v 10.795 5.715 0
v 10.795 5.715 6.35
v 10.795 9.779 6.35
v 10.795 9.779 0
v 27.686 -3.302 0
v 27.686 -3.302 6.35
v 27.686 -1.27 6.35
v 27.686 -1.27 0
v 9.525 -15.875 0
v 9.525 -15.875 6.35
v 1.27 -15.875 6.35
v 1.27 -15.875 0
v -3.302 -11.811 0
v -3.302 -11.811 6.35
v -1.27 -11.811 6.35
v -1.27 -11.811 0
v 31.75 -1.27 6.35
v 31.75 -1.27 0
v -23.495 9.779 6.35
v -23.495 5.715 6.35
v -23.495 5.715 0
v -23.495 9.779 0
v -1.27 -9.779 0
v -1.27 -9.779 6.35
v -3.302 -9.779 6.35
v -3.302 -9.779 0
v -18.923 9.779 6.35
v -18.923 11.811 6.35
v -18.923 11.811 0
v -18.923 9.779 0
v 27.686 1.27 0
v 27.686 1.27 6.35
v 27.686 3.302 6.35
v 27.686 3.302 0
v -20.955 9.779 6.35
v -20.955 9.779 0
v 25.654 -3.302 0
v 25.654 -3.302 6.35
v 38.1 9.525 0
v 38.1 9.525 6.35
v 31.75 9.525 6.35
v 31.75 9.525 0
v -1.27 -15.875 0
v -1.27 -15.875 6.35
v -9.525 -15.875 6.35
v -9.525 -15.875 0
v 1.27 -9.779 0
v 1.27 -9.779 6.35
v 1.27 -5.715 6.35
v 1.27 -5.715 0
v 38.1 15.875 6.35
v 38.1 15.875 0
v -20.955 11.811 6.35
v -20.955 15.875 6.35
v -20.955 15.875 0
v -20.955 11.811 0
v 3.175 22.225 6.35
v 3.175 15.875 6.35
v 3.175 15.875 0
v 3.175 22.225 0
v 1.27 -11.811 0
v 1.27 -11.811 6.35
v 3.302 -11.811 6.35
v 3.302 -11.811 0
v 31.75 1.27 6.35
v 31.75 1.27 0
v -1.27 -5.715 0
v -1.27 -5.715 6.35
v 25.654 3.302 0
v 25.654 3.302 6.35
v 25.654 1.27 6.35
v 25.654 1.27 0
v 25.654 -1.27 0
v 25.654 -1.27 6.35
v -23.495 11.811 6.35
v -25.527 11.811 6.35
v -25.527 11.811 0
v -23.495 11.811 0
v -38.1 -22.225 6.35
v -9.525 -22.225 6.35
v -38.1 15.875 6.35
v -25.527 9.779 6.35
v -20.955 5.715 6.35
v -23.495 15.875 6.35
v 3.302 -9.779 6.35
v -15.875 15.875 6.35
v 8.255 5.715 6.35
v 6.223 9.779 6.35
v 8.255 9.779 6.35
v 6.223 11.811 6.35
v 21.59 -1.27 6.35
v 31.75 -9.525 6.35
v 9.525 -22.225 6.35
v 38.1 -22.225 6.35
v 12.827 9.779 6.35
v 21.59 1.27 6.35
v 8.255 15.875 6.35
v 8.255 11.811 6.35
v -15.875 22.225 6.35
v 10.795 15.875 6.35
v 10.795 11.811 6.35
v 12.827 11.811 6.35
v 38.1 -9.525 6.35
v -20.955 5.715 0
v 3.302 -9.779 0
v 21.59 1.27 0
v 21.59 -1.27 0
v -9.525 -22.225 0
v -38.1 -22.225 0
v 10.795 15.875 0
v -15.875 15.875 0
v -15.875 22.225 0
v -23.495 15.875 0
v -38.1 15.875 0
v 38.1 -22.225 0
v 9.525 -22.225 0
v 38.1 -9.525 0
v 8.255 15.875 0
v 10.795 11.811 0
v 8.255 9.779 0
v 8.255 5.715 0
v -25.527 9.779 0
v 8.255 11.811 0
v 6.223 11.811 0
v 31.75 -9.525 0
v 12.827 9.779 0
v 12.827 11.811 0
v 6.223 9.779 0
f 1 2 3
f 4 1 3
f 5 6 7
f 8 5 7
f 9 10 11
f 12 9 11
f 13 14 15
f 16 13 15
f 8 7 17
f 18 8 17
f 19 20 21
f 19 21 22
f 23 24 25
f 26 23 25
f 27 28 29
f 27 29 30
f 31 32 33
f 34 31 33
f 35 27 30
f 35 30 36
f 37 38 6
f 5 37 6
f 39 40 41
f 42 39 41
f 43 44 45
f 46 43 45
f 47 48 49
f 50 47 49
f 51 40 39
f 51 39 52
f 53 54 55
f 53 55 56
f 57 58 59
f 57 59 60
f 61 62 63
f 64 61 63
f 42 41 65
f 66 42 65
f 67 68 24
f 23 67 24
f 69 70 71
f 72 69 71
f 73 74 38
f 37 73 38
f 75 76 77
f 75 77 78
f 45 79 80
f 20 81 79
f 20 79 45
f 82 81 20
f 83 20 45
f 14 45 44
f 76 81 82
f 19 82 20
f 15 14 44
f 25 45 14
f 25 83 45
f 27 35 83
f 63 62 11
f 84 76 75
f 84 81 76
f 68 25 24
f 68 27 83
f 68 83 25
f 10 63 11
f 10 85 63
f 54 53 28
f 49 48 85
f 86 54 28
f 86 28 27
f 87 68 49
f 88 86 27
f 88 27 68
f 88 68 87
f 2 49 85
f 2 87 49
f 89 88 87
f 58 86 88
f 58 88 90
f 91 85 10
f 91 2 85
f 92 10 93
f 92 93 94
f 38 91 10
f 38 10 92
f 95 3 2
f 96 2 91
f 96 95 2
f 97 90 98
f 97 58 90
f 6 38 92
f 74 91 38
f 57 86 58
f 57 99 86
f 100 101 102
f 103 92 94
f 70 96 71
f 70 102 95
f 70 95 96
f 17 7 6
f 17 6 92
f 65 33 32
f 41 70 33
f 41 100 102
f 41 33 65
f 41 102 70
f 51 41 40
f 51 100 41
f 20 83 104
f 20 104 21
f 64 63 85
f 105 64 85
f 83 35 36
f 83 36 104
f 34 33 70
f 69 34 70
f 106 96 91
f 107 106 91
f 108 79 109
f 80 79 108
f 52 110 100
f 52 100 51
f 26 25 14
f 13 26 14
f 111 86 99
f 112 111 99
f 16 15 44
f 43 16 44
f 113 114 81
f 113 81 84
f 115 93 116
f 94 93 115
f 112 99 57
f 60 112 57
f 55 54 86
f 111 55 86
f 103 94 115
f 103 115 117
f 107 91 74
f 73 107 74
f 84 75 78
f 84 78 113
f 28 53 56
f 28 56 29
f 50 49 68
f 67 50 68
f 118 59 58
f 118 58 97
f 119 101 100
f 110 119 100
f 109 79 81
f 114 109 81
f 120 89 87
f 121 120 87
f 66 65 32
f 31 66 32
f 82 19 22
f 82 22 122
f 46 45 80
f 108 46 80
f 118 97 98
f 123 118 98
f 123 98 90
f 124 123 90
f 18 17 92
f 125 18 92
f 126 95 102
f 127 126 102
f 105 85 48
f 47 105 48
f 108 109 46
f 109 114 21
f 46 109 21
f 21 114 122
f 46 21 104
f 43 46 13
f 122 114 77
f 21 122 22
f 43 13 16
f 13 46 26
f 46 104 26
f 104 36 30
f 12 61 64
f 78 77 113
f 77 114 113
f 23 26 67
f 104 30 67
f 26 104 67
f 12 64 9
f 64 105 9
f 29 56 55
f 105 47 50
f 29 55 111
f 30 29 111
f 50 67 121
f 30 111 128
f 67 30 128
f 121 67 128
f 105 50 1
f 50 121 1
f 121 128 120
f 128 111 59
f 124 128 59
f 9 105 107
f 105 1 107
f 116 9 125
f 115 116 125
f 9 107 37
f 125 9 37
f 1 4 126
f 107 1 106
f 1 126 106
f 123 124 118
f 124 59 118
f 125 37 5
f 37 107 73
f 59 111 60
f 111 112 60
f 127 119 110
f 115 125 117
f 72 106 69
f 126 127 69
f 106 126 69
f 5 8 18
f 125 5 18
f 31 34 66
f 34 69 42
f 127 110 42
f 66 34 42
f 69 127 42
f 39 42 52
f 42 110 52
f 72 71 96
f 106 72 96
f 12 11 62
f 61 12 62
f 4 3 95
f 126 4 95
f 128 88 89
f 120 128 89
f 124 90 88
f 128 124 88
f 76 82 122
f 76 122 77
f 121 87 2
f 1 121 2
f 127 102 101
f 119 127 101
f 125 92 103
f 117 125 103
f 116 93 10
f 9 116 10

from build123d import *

# Parameters (mm, degrees)
SKETCH1_W           = 76.2
SKETCH1_H           = 31.75
BOSS_EXTRUDE1_DEPTH = 6.35
SKETCH2_W           = 19.05
SKETCH2_H           = 6.35
BOSS_EXTRUDE2_DEPTH = 6.35
CUT_EXTRUDE1_DEPTH  = 6.35
CUT_EXTRUDE4_DEPTH  = 6.35
SKETCH5_W           = 76.2
SKETCH5_H           = 6.35
BOSS_EXTRUDE3_DEPTH = 6.35
CUT_EXTRUDE5_DEPTH  = 6.35


with BuildPart() as part:
    # Sketch1 → Boss-Extrude1 (new body)
    with BuildSketch(Plane.XY):
        Rectangle(SKETCH1_W, SKETCH1_H)
    extrude(amount=BOSS_EXTRUDE1_DEPTH)

    # Sketch2 → Boss-Extrude2 (add)
    with BuildSketch(Plane.XY.offset(6.35)):
        with Locations((-6.35, 19.05)):
            Rectangle(SKETCH2_W, SKETCH2_H)
    extrude(amount=-BOSS_EXTRUDE2_DEPTH)

    # Sketch3 → Cut-Extrude1 (cut)
    with BuildSketch(Plane.XY.offset(6.35)):
        Polygon((-20.955, 11.811), (-18.923, 11.811), (-18.923, 9.779), (-20.955, 9.779), (-20.955, 5.715), (-23.495, 5.715), (-23.495, 9.779), (-25.527, 9.779), (-25.527, 11.811), (-23.495, 11.811), (-23.495, 15.875), (-20.955, 15.875), align=None)
        Polygon((8.255, 9.779), (8.255, 5.715), (10.795, 5.715), (10.795, 9.779), (12.827, 9.779), (12.827, 11.811), (10.795, 11.811), (10.795, 15.875), (8.255, 15.875), (8.255, 11.811), (6.223, 11.811), (6.223, 9.779), align=None)
    extrude(amount=-CUT_EXTRUDE1_DEPTH, mode=Mode.SUBTRACT)

    # Sketch4 → Cut-Extrude4 (cut)
    with BuildSketch(Plane.XY.offset(6.35)):
        Polygon((31.75, -9.525), (38.1, -9.525), (38.1, 9.525), (31.75, 9.525), (31.75, 1.27), (27.686, 1.27), (27.686, 3.302), (25.654, 3.302), (25.654, 1.27), (21.59, 1.27), (21.59, -1.27), (25.654, -1.27), (25.654, -3.302), (27.686, -3.302), (27.686, -1.27), (31.75, -1.27), align=None)
    extrude(amount=-CUT_EXTRUDE4_DEPTH, mode=Mode.SUBTRACT)

    # Sketch5 → Boss-Extrude3 (add)
    with BuildSketch(Plane.XY.offset(6.35)):
        with Locations((0, -19.05)):
            Rectangle(SKETCH5_W, SKETCH5_H)
    extrude(amount=-BOSS_EXTRUDE3_DEPTH)

    # Sketch6 → Cut-Extrude5 (cut)
    with BuildSketch(Plane.XY.offset(6.35)):
        Polygon((-9.525, -22.225), (9.525, -22.225), (9.525, -15.875), (1.27, -15.875), (1.27, -11.811), (3.302, -11.811), (3.302, -9.779), (1.27, -9.779), (1.27, -5.715), (-1.27, -5.715), (-1.27, -9.779), (-3.302, -9.779), (-3.302, -11.811), (-1.27, -11.811), (-1.27, -15.875), (-9.525, -15.875), align=None)
    extrude(amount=-CUT_EXTRUDE5_DEPTH, mode=Mode.SUBTRACT)


solid = part.part
